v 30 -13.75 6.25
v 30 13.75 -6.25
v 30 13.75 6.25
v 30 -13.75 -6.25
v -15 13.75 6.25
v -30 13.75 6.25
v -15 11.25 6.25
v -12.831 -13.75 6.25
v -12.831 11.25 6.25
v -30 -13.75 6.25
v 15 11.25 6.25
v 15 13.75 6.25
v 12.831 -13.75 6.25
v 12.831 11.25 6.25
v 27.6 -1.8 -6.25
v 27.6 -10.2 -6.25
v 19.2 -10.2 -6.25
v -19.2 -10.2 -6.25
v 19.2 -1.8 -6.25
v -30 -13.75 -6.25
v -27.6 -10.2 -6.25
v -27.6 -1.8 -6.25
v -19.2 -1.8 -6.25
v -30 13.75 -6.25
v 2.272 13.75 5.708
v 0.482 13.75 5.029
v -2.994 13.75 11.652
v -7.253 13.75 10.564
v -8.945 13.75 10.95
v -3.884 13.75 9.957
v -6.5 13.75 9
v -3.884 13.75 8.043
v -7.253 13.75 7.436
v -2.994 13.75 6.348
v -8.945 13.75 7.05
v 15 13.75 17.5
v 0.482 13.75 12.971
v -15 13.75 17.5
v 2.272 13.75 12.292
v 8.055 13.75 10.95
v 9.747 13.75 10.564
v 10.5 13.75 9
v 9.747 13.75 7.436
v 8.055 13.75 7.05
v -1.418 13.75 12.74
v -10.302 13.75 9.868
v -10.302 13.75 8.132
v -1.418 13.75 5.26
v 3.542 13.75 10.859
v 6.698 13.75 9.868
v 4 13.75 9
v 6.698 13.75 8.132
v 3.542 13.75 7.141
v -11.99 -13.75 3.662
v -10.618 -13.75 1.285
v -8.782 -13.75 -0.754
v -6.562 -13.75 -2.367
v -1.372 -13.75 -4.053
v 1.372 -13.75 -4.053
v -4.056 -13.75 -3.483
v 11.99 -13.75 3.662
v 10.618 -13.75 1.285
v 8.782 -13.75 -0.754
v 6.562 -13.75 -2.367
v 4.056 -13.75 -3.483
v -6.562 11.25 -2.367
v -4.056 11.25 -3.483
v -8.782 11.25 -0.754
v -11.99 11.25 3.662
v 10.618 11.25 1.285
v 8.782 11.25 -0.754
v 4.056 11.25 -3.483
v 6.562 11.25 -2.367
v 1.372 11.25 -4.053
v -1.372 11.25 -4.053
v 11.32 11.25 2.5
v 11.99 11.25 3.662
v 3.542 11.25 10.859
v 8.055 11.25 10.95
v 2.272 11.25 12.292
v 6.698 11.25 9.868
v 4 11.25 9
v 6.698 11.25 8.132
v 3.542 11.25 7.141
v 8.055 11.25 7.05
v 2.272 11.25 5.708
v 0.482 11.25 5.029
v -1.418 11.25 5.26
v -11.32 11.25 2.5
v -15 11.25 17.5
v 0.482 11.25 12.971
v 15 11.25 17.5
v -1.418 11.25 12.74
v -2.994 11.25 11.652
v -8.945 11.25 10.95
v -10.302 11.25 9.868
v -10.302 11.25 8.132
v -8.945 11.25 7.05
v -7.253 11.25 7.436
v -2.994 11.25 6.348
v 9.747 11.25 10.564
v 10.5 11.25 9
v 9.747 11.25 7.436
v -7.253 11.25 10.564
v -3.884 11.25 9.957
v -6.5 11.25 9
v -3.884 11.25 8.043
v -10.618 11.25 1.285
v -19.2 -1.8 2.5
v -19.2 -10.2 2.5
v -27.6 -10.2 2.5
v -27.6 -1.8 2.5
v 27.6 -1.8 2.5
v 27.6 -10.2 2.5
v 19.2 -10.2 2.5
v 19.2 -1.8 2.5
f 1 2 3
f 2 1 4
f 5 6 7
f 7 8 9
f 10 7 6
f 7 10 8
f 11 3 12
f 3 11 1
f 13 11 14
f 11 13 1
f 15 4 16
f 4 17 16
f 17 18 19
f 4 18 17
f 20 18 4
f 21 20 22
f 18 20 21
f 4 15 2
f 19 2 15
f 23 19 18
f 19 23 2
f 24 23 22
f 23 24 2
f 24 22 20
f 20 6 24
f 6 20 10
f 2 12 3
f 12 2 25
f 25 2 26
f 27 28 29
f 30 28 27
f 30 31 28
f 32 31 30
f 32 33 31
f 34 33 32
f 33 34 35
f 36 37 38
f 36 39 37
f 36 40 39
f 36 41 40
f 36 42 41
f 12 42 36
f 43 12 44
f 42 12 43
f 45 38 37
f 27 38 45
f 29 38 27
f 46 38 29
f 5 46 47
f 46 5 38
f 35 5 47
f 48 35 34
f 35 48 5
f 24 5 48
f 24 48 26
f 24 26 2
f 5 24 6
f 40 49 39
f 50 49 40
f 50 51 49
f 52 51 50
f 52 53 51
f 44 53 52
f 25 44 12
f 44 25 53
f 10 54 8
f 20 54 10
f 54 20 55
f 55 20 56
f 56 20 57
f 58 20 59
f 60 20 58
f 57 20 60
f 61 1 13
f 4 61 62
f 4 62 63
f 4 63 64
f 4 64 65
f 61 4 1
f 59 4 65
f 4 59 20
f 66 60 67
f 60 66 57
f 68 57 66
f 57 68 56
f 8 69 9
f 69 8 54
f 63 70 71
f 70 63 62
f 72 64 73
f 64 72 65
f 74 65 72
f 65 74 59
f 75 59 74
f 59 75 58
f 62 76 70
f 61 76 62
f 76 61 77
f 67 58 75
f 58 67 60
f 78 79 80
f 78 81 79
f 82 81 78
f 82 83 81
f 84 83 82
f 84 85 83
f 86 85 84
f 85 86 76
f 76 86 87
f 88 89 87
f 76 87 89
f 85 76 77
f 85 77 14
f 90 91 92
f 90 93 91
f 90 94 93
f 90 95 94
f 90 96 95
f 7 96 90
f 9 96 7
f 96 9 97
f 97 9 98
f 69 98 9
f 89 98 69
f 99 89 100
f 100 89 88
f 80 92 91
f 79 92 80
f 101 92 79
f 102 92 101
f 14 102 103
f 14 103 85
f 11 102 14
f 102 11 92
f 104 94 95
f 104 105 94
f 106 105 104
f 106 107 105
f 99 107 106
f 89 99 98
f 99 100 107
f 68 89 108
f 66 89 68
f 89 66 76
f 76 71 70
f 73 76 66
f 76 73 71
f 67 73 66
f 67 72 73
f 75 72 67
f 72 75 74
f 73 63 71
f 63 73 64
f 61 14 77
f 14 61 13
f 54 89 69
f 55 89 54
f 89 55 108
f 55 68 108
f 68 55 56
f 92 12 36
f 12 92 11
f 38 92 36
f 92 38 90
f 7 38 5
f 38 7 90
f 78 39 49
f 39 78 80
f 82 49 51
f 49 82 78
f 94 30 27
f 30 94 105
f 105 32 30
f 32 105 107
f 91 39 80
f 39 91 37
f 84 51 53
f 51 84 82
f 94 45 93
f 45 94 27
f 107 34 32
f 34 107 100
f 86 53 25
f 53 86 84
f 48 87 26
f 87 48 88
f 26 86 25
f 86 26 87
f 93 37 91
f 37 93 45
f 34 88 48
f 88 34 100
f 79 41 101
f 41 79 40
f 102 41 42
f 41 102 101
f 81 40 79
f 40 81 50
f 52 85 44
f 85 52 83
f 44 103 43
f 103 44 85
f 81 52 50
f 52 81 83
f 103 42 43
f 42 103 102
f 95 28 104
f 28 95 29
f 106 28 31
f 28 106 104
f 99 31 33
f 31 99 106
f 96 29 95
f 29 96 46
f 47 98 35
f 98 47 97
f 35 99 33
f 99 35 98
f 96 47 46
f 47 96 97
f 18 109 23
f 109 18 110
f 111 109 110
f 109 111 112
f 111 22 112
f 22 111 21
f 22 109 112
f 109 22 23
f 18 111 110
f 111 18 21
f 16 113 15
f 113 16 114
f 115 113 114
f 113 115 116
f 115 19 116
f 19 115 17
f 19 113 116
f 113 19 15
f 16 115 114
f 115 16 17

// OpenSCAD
difference(){
difference(){
difference(){
difference(){
difference(){
union(){
difference(){
cube([60,27.5,12.5], true);
translate([0,11.25,9])rotate([90,0,0])cylinder(80,13.125,13.125);
}
translate([0,12.5,10])cube([30,2.5,15],true);
}
translate([0,20,9])rotate([90,0,0])cylinder(15,4,4);
}
translate([8.5,20,9])rotate([90,0,0])cylinder(15,2,2);
}
translate([-8.5,20,9])rotate([90,0,0])cylinder(15,2,2);
}
translate([-23.4,-6,-7.5])cube([8.4,8.4,20],true);
}
translate([23.4,-6,-7.5])cube([8.4,8.4,20],true);
}
